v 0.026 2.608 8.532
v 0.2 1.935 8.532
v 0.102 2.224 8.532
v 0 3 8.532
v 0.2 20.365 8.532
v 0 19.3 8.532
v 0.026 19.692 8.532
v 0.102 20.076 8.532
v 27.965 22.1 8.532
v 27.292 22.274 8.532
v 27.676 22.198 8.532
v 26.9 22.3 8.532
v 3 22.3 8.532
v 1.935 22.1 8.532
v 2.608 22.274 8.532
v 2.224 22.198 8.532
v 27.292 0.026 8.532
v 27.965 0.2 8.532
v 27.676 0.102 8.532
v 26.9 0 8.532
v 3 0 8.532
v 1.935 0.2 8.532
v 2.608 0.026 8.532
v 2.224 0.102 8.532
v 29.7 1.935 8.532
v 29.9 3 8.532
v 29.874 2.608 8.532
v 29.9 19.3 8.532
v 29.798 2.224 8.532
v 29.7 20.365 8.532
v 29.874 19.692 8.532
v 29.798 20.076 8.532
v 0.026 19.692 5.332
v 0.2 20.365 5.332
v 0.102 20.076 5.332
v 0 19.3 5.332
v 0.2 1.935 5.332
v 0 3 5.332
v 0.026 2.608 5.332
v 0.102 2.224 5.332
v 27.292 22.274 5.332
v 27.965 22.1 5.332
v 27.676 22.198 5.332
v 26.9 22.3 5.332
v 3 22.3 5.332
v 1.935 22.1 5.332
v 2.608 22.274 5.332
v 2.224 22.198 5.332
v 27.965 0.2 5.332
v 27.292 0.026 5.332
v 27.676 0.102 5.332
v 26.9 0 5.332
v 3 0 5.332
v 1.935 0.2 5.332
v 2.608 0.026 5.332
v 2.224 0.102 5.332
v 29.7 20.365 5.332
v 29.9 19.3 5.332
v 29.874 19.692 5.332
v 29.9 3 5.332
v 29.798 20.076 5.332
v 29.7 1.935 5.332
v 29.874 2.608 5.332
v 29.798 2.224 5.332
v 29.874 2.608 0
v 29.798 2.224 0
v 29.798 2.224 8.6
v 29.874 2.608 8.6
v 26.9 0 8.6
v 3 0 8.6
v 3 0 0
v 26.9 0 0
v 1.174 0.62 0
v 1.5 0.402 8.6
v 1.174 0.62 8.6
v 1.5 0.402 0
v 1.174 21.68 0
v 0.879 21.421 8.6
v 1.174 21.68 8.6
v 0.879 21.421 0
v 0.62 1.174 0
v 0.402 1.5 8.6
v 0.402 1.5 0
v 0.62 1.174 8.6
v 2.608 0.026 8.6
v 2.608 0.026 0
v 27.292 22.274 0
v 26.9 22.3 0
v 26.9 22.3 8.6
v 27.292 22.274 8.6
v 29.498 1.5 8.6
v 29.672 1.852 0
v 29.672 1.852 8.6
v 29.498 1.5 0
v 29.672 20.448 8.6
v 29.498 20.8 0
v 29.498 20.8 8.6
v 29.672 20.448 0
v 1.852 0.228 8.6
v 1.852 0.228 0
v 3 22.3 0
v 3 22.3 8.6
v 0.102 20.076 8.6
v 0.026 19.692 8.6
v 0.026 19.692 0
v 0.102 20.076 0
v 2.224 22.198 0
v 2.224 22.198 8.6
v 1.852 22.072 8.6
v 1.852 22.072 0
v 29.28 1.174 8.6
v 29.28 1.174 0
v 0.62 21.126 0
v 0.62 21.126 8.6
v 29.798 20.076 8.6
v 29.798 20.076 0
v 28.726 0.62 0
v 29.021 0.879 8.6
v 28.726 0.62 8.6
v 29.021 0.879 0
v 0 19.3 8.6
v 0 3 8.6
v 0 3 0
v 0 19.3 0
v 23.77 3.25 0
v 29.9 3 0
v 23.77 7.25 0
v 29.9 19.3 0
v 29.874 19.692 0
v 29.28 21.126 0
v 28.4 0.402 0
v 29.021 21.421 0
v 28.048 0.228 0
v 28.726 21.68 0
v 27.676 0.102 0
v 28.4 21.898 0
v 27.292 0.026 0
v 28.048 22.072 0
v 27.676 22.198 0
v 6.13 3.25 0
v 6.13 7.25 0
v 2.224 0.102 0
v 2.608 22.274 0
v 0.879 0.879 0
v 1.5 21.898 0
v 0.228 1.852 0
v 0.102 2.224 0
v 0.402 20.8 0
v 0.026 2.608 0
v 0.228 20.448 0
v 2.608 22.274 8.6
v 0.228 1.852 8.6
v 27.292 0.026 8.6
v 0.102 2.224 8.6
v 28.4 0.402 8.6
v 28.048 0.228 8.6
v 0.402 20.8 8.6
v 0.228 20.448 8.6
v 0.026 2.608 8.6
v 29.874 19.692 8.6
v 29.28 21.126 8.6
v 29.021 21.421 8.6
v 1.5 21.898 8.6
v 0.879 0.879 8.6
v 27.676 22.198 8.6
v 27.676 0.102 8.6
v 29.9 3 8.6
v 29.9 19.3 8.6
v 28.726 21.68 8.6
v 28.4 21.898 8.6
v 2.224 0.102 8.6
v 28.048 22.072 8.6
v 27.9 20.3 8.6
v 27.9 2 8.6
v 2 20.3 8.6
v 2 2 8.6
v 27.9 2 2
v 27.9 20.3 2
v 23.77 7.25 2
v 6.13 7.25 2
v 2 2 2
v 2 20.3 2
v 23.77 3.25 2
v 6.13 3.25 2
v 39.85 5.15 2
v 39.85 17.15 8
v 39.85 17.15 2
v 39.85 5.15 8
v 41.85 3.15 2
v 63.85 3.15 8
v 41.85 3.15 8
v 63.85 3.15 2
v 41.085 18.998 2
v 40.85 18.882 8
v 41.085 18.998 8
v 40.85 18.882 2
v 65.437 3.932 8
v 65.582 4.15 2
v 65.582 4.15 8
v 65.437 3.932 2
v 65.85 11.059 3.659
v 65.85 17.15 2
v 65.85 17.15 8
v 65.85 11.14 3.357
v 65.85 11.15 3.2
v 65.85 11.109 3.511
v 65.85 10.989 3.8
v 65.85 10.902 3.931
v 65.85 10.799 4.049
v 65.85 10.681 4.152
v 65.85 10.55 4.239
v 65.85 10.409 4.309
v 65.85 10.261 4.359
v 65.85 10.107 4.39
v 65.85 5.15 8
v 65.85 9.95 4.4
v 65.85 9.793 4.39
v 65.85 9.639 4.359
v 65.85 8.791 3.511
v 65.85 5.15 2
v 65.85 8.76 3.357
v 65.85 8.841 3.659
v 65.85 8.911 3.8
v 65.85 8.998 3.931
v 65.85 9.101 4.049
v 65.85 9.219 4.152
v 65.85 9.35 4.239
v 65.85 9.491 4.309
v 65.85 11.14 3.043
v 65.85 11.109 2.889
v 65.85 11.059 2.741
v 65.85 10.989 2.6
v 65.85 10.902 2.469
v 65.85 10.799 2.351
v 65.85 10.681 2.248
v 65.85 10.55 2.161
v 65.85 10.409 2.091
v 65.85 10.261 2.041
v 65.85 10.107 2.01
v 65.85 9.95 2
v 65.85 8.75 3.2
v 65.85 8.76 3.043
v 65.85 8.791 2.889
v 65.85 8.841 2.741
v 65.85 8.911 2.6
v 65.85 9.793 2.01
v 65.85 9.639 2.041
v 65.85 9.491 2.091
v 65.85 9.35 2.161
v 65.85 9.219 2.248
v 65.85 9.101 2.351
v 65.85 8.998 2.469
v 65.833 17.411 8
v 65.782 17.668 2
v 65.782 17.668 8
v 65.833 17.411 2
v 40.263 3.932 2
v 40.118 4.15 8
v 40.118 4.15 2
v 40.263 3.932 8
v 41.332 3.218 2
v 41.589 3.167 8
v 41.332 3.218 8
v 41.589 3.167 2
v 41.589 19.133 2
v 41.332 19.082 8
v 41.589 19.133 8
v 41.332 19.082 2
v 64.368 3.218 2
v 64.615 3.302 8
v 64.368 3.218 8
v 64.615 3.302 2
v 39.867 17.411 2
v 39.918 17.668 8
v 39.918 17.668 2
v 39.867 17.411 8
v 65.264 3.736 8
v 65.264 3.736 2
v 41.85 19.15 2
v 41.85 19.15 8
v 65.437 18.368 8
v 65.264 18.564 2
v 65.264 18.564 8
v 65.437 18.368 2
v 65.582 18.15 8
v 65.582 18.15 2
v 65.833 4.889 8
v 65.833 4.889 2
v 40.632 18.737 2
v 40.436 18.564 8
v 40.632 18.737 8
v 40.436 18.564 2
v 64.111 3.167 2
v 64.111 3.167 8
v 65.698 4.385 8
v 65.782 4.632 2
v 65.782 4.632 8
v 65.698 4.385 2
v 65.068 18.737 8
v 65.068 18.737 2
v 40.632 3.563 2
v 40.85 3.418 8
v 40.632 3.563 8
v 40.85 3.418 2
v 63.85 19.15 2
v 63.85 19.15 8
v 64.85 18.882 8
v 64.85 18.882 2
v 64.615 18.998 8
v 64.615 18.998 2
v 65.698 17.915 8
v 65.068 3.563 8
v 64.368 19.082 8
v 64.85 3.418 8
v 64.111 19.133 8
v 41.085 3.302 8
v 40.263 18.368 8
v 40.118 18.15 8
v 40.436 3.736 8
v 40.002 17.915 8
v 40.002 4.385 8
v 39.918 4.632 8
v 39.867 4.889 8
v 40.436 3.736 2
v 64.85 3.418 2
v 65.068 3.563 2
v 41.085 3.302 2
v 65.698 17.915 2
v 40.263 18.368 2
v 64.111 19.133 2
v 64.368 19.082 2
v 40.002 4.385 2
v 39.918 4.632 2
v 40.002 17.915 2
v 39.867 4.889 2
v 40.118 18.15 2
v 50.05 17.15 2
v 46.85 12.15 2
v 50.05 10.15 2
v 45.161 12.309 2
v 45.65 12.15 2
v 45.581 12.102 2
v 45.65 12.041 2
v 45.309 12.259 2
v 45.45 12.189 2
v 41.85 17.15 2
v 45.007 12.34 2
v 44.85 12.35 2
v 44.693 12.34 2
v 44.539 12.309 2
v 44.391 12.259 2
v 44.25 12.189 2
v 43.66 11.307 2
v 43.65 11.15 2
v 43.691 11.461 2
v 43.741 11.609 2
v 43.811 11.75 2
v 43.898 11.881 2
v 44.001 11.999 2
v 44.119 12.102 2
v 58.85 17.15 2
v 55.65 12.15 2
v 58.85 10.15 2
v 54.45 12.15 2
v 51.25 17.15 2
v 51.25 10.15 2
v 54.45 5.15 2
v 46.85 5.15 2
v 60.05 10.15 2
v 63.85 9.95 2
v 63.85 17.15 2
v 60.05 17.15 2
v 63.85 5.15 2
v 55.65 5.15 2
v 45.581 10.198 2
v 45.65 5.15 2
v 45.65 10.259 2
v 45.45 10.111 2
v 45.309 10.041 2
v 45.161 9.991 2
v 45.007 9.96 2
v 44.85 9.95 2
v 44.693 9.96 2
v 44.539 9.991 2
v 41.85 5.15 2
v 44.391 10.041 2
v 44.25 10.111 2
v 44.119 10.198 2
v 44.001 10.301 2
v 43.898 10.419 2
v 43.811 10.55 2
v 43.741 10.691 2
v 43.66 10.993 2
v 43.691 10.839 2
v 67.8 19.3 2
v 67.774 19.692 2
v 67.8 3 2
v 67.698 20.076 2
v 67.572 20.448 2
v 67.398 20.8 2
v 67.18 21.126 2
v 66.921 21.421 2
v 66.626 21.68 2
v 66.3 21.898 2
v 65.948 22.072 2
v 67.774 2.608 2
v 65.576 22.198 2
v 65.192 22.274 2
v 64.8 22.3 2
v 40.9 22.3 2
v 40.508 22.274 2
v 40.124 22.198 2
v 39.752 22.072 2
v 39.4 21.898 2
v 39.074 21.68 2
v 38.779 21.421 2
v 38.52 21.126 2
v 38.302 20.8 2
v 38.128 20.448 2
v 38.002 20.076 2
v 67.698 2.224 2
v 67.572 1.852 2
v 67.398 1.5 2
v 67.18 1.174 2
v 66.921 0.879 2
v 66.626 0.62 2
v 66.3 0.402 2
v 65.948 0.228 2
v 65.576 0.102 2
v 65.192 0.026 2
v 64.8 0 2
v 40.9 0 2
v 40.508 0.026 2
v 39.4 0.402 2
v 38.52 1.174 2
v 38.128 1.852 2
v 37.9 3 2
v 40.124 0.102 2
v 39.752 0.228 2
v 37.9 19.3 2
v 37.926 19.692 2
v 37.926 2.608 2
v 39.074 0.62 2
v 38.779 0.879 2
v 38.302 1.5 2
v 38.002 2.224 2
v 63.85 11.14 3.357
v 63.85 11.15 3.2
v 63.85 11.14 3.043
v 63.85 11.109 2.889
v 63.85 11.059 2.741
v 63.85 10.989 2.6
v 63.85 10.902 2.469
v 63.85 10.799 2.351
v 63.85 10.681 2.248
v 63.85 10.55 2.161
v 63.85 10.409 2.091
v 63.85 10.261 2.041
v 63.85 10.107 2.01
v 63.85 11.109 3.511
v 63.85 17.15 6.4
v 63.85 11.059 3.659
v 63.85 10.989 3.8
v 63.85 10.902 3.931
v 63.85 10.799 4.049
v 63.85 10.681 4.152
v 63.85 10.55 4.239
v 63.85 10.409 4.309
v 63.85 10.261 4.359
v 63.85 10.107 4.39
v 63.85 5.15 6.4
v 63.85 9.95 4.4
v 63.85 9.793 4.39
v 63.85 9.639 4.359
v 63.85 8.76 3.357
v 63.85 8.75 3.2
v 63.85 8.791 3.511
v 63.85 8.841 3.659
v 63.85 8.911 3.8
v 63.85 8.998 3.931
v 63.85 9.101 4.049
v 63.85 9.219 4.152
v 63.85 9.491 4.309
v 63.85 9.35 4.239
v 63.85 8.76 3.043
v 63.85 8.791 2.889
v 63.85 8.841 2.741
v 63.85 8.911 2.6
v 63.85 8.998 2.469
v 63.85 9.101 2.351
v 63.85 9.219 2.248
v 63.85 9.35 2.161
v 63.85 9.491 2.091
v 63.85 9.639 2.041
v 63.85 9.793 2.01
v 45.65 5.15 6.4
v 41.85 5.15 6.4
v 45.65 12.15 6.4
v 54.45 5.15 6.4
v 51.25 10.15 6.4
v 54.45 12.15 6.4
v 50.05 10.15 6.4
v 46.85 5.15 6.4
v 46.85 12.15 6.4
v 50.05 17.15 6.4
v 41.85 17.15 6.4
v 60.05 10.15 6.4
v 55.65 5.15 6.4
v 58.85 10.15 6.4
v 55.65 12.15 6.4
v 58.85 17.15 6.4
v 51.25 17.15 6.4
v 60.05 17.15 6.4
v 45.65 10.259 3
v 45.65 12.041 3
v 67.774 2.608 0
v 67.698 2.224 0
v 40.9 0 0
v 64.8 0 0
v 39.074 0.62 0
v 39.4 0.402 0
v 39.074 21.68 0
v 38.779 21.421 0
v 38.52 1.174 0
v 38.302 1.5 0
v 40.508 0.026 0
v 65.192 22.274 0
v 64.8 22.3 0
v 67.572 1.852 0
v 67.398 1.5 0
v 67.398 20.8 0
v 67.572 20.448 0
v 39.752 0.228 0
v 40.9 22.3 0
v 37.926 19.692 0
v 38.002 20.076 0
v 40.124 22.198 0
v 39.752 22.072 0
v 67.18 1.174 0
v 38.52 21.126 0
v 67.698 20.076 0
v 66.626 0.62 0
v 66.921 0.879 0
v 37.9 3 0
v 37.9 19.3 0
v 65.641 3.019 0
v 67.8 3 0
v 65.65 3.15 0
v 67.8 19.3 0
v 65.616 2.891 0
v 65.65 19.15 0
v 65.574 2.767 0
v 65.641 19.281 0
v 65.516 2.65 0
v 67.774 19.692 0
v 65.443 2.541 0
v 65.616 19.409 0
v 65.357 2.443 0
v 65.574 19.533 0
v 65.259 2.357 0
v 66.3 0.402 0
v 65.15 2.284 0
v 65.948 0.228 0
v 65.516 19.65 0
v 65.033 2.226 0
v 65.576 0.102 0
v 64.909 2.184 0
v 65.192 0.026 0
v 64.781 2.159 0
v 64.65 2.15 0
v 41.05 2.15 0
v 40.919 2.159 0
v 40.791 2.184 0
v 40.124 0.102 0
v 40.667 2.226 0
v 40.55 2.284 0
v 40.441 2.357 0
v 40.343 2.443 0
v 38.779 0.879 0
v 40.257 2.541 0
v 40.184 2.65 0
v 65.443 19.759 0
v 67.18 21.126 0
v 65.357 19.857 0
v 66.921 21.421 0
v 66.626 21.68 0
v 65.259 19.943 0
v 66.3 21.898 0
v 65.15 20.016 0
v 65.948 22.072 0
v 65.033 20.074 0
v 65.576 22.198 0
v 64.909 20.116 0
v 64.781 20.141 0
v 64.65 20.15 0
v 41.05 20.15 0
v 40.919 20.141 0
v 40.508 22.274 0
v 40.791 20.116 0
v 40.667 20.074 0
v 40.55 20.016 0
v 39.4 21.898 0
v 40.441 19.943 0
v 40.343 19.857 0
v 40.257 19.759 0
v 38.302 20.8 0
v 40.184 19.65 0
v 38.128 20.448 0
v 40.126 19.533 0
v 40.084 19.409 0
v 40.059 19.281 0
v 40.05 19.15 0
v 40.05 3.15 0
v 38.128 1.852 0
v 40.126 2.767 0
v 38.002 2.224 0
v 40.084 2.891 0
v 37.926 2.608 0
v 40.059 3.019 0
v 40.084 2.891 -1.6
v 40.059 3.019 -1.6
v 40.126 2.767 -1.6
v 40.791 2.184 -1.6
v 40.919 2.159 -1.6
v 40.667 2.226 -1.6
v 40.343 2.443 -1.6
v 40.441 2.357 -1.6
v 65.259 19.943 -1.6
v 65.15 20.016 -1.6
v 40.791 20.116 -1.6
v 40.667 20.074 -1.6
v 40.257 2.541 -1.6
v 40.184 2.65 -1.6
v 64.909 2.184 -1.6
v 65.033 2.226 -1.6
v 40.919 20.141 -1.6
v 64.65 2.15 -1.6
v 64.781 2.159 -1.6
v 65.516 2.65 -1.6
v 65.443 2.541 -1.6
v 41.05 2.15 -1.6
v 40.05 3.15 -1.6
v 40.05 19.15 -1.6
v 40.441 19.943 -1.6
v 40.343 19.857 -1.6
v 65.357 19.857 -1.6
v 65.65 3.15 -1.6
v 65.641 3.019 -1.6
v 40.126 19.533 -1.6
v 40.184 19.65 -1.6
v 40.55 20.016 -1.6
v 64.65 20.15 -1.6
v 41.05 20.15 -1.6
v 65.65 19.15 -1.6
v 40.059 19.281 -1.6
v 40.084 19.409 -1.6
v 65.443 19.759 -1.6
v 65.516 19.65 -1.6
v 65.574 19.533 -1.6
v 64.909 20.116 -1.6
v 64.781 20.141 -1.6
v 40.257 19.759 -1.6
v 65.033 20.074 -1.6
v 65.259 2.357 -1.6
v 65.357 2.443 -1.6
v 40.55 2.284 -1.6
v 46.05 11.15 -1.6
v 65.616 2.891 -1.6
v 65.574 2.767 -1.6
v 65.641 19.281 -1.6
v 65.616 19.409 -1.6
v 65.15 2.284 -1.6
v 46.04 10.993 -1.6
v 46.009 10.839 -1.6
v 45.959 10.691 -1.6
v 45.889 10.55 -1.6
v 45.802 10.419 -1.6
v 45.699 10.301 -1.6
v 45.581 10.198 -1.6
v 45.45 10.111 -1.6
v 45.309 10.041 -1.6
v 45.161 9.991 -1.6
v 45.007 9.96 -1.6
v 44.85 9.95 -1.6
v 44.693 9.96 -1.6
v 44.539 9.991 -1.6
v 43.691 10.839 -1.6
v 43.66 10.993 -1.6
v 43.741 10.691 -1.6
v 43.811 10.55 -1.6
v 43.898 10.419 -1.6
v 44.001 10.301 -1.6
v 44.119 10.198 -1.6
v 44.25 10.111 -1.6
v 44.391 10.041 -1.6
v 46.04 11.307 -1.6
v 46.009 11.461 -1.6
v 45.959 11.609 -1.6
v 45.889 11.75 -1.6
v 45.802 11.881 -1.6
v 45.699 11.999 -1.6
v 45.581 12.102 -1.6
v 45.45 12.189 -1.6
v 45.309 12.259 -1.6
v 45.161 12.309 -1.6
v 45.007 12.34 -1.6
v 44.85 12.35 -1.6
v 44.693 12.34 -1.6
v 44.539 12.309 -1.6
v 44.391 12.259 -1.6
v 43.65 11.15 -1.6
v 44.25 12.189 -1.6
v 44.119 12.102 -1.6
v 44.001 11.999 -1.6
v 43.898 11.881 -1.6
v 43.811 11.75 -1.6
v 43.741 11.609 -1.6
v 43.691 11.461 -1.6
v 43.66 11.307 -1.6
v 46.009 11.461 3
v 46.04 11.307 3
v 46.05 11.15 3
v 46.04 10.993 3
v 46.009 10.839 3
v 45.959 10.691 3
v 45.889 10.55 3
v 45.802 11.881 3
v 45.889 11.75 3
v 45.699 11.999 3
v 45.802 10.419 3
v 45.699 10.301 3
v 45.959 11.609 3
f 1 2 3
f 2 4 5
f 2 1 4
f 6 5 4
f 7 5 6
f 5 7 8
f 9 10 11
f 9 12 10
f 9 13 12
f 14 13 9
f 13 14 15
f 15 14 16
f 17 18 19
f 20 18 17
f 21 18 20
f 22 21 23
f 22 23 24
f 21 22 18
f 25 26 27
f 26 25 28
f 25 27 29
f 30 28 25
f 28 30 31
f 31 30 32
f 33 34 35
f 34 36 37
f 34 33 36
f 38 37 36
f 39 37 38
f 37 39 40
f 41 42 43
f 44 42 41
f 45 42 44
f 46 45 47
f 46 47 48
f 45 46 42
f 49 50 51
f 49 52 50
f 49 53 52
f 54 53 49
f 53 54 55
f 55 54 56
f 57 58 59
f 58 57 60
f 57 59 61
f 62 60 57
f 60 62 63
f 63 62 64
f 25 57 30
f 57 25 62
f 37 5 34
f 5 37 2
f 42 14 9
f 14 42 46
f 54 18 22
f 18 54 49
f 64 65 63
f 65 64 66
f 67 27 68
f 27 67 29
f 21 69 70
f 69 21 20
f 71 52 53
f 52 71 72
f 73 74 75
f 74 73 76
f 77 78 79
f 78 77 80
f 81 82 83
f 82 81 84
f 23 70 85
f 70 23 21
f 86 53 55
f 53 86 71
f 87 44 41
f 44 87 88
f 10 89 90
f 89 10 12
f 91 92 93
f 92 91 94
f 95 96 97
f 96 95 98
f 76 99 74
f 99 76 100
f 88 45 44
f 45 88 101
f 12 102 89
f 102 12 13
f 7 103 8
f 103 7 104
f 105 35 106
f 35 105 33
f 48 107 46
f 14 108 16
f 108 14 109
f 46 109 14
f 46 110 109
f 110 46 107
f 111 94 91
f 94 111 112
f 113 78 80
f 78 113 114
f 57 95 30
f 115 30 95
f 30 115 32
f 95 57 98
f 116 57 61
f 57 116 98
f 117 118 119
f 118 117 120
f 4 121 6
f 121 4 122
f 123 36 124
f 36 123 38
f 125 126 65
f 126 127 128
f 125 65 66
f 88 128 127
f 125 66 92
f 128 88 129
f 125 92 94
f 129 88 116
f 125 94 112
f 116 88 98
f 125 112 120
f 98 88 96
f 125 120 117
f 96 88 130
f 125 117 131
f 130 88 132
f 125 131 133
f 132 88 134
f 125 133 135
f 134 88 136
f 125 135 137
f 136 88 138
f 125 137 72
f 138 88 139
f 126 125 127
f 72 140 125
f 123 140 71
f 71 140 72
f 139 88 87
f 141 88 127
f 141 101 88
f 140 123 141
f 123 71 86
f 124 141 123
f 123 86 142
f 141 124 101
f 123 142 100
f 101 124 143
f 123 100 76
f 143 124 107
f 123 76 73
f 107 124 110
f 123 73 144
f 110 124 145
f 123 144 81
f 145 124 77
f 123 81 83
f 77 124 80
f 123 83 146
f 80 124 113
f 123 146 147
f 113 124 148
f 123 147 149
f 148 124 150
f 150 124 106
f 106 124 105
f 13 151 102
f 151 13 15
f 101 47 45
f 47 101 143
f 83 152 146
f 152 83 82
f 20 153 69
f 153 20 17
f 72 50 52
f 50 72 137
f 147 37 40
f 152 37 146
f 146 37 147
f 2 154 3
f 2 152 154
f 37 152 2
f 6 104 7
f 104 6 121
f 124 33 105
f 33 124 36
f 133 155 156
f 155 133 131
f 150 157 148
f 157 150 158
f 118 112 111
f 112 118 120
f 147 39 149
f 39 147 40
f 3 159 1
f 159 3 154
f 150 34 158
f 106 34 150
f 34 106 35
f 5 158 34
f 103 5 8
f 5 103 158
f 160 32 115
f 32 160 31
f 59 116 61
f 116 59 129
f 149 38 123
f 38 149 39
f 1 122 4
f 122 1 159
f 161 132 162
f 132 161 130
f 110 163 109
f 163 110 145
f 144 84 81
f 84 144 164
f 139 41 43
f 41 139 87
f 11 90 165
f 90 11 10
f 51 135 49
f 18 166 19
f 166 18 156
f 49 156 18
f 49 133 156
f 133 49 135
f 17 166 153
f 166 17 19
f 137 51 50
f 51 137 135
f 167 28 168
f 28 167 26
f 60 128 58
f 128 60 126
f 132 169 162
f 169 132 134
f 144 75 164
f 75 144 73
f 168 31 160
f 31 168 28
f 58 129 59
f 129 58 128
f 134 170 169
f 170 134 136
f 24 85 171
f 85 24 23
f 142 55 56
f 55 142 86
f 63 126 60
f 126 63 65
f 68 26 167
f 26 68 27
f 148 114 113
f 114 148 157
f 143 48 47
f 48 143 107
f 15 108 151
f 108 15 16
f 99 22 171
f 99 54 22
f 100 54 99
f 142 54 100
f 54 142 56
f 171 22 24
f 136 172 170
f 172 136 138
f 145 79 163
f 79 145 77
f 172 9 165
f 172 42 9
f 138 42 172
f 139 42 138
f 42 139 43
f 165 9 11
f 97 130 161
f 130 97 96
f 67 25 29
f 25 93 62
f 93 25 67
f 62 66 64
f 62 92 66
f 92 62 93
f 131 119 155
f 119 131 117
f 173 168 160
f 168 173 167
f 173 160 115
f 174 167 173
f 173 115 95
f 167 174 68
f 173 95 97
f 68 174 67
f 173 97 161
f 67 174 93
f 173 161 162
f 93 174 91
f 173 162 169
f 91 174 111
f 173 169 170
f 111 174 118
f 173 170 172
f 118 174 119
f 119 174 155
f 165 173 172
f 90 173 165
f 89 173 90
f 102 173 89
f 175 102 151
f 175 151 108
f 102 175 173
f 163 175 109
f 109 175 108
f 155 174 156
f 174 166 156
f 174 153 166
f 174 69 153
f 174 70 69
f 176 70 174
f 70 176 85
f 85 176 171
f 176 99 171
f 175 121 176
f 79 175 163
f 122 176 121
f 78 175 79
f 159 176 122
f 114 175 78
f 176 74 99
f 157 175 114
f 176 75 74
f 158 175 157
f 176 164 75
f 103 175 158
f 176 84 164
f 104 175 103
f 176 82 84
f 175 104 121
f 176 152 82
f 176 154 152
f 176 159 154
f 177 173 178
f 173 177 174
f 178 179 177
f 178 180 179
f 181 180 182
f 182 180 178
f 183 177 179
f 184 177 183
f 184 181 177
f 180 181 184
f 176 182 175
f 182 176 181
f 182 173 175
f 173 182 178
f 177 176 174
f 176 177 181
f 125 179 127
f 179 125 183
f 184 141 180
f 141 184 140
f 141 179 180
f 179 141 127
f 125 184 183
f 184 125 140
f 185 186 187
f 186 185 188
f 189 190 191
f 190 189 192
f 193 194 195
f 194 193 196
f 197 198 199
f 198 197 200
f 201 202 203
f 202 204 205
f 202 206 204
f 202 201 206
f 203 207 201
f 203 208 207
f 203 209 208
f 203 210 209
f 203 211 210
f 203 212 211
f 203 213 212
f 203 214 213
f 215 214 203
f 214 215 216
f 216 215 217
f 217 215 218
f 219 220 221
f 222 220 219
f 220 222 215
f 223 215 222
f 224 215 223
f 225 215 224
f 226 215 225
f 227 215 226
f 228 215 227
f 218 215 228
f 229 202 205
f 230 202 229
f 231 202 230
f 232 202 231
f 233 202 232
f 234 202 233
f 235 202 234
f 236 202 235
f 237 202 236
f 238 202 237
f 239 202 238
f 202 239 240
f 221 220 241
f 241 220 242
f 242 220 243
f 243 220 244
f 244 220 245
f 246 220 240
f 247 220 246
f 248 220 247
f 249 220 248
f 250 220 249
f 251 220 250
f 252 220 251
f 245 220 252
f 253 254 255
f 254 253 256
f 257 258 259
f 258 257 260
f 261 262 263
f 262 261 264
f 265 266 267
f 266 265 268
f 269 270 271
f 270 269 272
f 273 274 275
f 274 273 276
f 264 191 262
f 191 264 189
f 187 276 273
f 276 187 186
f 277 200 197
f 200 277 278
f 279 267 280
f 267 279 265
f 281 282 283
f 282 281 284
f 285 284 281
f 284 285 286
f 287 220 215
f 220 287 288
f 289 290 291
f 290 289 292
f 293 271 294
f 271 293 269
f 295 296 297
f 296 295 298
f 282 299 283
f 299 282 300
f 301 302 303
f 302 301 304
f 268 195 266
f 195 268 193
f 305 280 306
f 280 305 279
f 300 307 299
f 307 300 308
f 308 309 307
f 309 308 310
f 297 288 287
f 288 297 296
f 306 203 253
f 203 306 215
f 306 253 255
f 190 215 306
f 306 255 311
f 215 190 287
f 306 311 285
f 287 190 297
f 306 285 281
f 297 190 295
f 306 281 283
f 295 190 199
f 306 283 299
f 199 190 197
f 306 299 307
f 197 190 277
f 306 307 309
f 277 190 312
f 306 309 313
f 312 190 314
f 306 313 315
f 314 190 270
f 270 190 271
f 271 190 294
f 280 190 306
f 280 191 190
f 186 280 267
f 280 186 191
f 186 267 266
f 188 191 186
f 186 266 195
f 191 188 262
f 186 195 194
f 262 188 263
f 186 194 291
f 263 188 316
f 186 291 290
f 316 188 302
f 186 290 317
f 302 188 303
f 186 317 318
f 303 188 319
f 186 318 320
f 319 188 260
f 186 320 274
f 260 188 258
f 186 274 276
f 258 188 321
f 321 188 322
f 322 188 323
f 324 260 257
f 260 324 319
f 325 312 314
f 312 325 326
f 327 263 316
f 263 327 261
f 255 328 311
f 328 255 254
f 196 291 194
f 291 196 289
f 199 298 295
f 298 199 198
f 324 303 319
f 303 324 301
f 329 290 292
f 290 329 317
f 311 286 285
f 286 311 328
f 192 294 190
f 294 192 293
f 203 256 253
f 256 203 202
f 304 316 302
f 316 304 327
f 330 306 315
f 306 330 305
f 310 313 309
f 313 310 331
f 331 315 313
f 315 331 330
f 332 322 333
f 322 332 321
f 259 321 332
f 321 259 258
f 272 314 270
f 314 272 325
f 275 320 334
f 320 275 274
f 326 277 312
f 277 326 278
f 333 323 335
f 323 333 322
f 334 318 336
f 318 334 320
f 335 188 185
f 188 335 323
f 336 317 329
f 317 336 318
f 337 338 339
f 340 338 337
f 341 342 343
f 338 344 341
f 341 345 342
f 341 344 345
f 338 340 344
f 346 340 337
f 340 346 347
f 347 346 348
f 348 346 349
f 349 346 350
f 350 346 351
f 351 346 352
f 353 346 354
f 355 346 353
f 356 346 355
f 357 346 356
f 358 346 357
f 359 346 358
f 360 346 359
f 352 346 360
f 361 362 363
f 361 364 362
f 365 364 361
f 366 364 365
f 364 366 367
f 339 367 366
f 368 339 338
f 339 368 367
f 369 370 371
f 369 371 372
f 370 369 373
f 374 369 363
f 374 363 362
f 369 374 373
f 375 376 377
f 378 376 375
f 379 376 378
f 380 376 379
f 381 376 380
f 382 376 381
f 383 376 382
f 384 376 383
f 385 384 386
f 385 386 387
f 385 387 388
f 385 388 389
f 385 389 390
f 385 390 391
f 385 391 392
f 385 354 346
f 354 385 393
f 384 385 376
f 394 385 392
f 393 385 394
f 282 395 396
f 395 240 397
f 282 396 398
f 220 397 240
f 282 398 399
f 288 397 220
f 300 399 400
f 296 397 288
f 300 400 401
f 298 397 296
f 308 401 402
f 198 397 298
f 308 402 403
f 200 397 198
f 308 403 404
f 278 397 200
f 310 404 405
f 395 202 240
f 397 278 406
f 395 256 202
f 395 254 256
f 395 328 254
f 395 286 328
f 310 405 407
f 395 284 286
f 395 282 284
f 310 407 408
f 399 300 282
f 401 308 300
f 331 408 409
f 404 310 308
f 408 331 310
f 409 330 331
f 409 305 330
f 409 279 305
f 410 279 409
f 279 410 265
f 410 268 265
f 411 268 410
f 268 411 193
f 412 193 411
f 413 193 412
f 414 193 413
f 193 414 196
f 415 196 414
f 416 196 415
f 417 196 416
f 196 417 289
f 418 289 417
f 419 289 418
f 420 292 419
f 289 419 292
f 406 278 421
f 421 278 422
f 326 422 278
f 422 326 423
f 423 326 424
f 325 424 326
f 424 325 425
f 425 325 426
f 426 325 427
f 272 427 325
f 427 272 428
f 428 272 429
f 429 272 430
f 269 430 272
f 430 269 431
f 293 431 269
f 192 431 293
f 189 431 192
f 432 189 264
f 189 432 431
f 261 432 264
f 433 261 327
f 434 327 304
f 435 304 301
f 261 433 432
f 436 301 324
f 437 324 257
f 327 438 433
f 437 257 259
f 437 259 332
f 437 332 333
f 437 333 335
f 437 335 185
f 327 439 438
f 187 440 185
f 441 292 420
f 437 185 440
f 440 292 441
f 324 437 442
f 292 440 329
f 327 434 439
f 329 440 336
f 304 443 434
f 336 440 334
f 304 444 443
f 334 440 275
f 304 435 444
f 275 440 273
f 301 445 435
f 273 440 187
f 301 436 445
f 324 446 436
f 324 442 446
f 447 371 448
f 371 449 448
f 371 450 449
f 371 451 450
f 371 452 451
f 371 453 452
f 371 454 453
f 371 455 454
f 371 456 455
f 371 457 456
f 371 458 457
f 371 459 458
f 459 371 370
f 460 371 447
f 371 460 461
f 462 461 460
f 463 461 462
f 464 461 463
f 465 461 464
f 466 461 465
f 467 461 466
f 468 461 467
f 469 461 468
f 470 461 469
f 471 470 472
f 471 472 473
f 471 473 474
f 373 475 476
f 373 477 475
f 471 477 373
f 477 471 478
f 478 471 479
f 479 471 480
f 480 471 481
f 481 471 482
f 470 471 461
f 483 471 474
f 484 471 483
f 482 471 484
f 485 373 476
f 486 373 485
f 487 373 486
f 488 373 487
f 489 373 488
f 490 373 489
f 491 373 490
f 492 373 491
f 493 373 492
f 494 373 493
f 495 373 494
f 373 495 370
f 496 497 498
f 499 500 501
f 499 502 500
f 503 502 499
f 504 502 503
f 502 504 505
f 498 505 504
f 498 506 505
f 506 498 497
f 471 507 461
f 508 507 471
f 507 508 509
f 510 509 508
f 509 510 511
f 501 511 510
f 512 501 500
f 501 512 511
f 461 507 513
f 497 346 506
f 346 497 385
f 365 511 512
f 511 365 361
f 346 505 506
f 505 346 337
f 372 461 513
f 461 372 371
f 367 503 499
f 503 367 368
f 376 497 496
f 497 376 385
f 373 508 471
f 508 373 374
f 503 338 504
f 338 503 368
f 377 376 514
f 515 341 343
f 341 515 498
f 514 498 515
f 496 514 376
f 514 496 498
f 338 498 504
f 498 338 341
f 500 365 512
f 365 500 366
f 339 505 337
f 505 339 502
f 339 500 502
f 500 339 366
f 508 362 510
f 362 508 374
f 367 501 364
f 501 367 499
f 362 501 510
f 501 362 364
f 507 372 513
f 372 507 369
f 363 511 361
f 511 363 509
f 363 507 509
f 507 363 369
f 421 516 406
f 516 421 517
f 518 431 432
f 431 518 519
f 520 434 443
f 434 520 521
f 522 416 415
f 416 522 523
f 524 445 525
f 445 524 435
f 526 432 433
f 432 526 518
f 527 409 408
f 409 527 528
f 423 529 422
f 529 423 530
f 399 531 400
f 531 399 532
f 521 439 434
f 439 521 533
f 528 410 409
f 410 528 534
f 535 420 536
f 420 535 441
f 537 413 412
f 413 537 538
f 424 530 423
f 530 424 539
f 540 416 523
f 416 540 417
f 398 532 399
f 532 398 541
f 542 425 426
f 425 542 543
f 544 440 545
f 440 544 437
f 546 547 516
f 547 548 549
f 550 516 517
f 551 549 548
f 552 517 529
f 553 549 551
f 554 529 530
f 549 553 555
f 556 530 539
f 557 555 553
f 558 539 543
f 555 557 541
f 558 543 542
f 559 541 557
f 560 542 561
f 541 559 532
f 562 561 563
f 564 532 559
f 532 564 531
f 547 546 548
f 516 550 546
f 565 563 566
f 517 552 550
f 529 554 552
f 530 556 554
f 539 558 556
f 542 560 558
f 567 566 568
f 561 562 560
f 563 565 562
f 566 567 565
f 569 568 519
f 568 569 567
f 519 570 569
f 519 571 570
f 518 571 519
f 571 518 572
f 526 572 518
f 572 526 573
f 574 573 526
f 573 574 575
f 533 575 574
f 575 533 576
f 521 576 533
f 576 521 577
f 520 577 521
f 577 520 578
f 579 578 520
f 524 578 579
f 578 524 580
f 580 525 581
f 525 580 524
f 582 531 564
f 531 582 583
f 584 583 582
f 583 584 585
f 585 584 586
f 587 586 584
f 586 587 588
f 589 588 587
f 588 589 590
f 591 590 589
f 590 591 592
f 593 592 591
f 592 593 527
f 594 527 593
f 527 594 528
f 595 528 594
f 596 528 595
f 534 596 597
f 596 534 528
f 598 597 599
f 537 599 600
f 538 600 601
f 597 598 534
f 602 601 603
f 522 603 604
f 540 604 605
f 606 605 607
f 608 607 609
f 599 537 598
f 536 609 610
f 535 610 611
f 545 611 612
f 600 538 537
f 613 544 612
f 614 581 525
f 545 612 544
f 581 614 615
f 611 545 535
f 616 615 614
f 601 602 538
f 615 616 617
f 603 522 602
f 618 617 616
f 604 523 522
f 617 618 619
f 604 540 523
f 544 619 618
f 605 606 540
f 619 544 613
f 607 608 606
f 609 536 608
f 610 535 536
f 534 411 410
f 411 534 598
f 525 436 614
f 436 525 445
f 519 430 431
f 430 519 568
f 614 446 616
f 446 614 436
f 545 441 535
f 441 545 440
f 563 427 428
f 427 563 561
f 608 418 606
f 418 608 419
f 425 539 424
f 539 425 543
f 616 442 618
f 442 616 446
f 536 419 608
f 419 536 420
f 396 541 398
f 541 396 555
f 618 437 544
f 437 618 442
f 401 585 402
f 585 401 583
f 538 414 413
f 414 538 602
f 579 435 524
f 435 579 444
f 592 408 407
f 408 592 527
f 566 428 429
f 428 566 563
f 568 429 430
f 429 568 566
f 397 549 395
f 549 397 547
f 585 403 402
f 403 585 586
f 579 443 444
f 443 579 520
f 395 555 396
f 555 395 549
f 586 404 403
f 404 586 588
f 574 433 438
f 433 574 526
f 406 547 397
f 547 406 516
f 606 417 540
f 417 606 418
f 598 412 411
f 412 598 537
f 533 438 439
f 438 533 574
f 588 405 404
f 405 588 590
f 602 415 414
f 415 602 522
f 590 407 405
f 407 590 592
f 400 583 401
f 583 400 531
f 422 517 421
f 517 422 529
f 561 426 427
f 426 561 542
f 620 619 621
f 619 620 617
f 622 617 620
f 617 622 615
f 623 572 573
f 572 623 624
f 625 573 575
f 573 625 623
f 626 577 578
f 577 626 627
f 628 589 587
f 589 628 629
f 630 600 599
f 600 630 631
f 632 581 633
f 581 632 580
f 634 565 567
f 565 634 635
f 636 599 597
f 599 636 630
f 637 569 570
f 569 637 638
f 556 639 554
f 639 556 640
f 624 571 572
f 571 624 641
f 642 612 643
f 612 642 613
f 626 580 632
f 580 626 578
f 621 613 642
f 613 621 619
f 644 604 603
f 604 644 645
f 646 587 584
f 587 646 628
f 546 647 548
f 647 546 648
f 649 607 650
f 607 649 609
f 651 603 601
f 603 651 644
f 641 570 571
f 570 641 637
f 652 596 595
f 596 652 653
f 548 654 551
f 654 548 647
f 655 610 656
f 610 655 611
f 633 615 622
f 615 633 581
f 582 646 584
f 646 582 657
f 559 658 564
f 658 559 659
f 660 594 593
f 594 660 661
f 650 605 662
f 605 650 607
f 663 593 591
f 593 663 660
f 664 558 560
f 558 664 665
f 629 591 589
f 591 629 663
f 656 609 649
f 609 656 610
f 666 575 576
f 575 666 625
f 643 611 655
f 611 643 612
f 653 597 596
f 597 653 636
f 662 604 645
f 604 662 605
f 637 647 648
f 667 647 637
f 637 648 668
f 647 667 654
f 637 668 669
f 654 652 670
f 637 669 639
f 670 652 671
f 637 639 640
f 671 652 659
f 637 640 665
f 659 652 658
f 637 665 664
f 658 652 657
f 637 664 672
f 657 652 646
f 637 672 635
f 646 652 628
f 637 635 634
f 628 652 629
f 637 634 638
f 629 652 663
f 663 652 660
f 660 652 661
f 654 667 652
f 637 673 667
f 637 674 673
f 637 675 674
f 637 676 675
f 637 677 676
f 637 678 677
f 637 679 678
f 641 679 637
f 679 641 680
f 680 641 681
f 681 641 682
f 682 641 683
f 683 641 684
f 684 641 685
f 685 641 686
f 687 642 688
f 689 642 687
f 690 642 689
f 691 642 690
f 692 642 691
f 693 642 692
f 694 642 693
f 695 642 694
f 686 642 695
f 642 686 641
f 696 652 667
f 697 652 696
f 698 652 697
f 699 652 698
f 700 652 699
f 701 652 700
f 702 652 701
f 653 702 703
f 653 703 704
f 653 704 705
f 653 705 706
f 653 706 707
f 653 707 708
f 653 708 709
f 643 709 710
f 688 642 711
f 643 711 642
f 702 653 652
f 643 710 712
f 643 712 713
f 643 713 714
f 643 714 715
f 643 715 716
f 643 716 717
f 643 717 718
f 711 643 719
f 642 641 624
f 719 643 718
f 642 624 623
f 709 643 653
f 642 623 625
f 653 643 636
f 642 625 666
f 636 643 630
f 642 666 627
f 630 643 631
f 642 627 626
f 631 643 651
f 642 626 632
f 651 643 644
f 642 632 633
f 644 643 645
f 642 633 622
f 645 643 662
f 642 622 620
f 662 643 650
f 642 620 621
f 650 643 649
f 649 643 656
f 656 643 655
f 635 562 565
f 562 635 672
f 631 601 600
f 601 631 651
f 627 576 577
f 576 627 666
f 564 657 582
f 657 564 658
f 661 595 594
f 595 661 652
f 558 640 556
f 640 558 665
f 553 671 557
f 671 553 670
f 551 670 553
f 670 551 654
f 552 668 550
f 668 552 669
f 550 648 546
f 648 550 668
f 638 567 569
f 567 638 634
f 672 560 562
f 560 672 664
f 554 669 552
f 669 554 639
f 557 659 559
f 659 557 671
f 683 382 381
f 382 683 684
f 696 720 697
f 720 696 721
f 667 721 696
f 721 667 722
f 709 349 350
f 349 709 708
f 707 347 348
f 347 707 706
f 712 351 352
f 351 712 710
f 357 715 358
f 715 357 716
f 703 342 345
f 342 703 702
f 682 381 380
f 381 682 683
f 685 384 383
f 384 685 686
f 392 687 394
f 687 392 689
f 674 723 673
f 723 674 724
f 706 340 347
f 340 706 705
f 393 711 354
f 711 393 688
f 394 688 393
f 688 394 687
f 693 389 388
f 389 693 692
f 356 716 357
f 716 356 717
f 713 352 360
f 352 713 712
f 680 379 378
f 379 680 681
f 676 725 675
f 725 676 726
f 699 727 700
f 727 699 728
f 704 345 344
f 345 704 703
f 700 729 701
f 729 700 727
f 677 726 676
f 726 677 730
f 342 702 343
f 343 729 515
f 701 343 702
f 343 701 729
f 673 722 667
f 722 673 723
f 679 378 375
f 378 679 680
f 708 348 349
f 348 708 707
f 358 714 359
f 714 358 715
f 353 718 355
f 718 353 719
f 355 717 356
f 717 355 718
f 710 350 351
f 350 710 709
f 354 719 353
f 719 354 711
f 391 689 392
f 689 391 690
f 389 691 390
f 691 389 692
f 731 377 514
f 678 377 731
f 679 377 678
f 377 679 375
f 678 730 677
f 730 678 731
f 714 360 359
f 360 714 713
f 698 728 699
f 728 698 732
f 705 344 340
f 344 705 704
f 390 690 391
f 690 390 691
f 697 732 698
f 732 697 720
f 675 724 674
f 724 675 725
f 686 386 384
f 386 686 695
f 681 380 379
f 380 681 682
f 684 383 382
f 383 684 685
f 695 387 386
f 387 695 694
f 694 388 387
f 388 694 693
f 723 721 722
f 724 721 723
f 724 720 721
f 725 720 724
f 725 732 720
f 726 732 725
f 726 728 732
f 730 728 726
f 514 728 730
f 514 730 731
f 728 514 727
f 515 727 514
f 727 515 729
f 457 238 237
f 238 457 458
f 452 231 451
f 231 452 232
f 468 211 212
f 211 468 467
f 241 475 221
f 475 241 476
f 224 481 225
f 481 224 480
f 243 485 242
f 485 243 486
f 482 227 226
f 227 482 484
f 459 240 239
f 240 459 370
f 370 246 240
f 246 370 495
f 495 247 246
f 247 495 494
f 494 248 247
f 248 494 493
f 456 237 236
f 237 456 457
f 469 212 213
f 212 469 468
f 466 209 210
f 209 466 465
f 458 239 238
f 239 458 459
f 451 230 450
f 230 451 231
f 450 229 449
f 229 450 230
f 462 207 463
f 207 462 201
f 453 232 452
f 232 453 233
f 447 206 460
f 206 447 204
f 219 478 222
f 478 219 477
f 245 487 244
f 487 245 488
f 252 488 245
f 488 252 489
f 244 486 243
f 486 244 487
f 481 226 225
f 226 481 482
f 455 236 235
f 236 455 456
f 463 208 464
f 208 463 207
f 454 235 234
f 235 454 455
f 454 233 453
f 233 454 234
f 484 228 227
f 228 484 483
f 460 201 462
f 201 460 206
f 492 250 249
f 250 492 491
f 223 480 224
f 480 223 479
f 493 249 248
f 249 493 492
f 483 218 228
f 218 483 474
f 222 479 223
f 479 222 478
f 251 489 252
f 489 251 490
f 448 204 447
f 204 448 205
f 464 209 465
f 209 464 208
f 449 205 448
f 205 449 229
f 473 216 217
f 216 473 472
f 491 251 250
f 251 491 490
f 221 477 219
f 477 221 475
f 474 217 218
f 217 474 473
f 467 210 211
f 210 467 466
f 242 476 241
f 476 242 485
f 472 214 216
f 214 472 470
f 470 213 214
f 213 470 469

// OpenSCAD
// =============================================================================
// DPS310 barometric sensor case — offset-baffle static port, no foam
// =============================================================================
// A pressure sensor measures STATIC pressure. Ram air is dynamic pressure: at
// 20 km/h that is 0.19 hPa, about 1.5 m of apparent climb, and at 40 km/h it is
// 6 m. So the case must let the atmosphere in while refusing to let moving air
// in -- an open hole would inject 60x the sensor's own noise, and the error would
// track road speed, which the slope estimator would faithfully report as climb.
//
// Instead of foam, the air has to turn corners. Four offset baffles make a
// serpentine in a box on the lid: the path is long, each corner costs pressure,
// and a gust cannot carry momentum through it. The port through the box wall
// sits low and to the side, so rain has to travel around every corner and uphill
// to reach the sensor.
//
// Print
//   Base: open side up.  Lid: flat face down (baffles grow upward -- no
//   overhangs, no supports). 0.2 mm layers, 3 perimeters, 20% infill.
//   PETG for UV/water; PLA is fine for a fit check but goes brittle in sun/cold.
//
// Assembly
//   1. Board drops into the base; the pocket is a light press fit.
//   2. Lid presses on; the lip holds it. One zip tie round the case locks it
//      and mounts it -- the groove stops the tie sliding off.
//   3. Strap it under the top tube or behind the seat tube, port pointing
//      down/back, in the aerodynamic shadow. Not on the bars.
// =============================================================================

part = "both";   // "base", "lid", "both", or "none" -- override with -D part="..."
$fn = 48;

// --- the board (Adafruit STEMMA QT breakout, 25.4 x 17.8) --------------------
board_w    = 25.4;
board_d    = 17.8;
board_t    = 1.6;
board_fit  = 0.25;    // pocket clearance per side (press fit)
headroom   = 5.0;     // above the PCB: QT connector is ~3.2 mm tall
                      // (also clears a header block mounted on top of the board)

// --- header slot in the floor ------------------------------------------------
// A 7-pin header soldered along one long edge of the board, pins leaving through
// the bottom. The slot is a narrow rectangle under that header only: the rest of
// the floor stays, so the board still rests flat on it.
header_pins   = 7;
header_pitch  = 2.54;
header_slot_l = (header_pins - 1) * header_pitch + 2.4;   // 17.6 mm for 7 pins
header_slot_w = 4.0;      // clears the pins AND lets the plastic block sit in it
header_inset  = 3.0;      // slot centre, measured in from the board edge
header_side   = -1;       // -1 = near long edge, +1 = far long edge
header_shift  = 0.0;      // along the long axis; 0 = centred on the board

// --- shell -------------------------------------------------------------------
wall       = 2.0;
floor_t    = 2.0;
lid_t      = 2.0;
lip        = 1.6;     // lid lip depth into the base
lip_fit    = 0.15;    // clearance; the zip tie is what holds the lid on
corner_r   = 3.0;
tie_w      = 3.2;     // zip-tie groove width
tie_d      = 1.2;     // groove depth into the outer wall

// --- baffle stack ------------------------------------------------------------
baffles    = 4;
baffle_t   = 1.2;
baffle_gap = 5.0;
port_d     = 2.4;
box_l      = 26.0;
box_w      = 16.0;
box_h      = 6.0;
ceiling_t   = 1.6;    // roof over the baffle box: without it the walls do nothing

// -----------------------------------------------------------------------------
in_x  = board_w + 2*board_fit;
in_y  = board_d + 2*board_fit;
in_z  = board_t + headroom;
out_x = in_x + 2*wall;
out_y = in_y + 2*wall;
h_out = floor_t + in_z;

module rounded_box(x, y, z, r) {
    hull() for (dx = [r, x-r], dy = [r, y-r])
        translate([dx, dy, 0]) cylinder(r = r, h = z);
}

// -----------------------------------------------------------------------------
module base() {
    difference() {
        rounded_box(out_x, out_y, h_out, corner_r);
        // cavity (leaves floor + walls). Square corners, not rounded: the board
        // has square corners and a rounded pocket cuts into them -- four slivers
        // of interference, which is exactly enough to stop it dropping in.
        translate([wall, wall, floor_t])
            cube([in_x, in_y, in_z + 1]);
        // zip-tie groove around the outside
        translate([-1, -1, h_out*0.62])
            difference() {
                cube([out_x + 2, out_y + 2, tie_w]);
                translate([tie_d, tie_d, -1])
                    cube([out_x + 2 - 2*tie_d, out_y + 2 - 2*tie_d, tie_w + 2]);
            }
        // header slot: a thin rectangle under the header only
        translate([wall + board_fit + (board_w - header_slot_l)/2 + header_shift,
                   (header_side < 0 ? wall + board_fit + header_inset
                                    : wall + board_fit + board_d - header_inset)
                       - header_slot_w/2,
                   -1])
            cube([header_slot_l, header_slot_w, floor_t + 2]);
    }
}

// -----------------------------------------------------------------------------
module baffle_walls() {
    inner_l = box_l - 2*wall;
    inner_w = box_w - 2*wall;
    step = inner_l / (baffles + 1);
    for (i = [0 : baffles-1]) {
        x = wall + step * (i + 1) - baffle_t/2;
        doy = (i % 2 == 0) ? 0 : baffle_gap;
        translate([x, wall + doy, 0])
            cube([baffle_t, inner_w - baffle_gap, box_h - ceiling_t + 0.01]);
    }
}

module lid() {
    difference() {
        union() {
            rounded_box(out_x, out_y, lid_t, corner_r);
            // locating lip: sits inside the cavity and presses on the walls
            translate([wall + lip_fit, wall + lip_fit, -lip])
                rounded_box(in_x - 2*lip_fit, in_y - 2*lip_fit, lip + 0.02, 1.0);
            // baffle box, open at the top so it prints as a shell
            translate([(out_x - box_l)/2, (out_y - box_w)/2, lid_t])
                difference() {
                    rounded_box(box_l, box_w, box_h, 2.0);
                    // stop 1.6 mm short of the top: that remaining material is
                    // the roof. An open-topped baffle box is a comb the air
                    // flows straight over.
                    translate([wall, wall, -1])
                        cube([box_l - 2*wall, box_w - 2*wall, box_h - ceiling_t + 1]);
                }
            // baffles are SOLID and added back inside the hollow box
            translate([(out_x - box_l)/2, (out_y - box_w)/2, lid_t])
                baffle_walls();
        }
        // into the plenum, at the end of the snake furthest from the outlet
        translate([(out_x - box_l)/2 + wall + 3, out_y/2, -lip])
            cylinder(d = port_d, h = lip + lid_t + 1);
        // outlet to atmosphere, low in the box wall, facing sideways
        translate([(out_x - box_l)/2 + box_l - wall - 1.0, out_y/2 - port_d/2, lid_t + 1.2])
            rotate([0, 90, 0])
                cylinder(d = port_d, h = wall + 2);
    }
}

// -----------------------------------------------------------------------------
if (part == "base")      base();
else if (part == "lid")  lid();
else if (part == "both") { base(); translate([out_x + 8, 0, 0]) lid(); }
// anything else renders nothing, so an including file can draw its own scene
